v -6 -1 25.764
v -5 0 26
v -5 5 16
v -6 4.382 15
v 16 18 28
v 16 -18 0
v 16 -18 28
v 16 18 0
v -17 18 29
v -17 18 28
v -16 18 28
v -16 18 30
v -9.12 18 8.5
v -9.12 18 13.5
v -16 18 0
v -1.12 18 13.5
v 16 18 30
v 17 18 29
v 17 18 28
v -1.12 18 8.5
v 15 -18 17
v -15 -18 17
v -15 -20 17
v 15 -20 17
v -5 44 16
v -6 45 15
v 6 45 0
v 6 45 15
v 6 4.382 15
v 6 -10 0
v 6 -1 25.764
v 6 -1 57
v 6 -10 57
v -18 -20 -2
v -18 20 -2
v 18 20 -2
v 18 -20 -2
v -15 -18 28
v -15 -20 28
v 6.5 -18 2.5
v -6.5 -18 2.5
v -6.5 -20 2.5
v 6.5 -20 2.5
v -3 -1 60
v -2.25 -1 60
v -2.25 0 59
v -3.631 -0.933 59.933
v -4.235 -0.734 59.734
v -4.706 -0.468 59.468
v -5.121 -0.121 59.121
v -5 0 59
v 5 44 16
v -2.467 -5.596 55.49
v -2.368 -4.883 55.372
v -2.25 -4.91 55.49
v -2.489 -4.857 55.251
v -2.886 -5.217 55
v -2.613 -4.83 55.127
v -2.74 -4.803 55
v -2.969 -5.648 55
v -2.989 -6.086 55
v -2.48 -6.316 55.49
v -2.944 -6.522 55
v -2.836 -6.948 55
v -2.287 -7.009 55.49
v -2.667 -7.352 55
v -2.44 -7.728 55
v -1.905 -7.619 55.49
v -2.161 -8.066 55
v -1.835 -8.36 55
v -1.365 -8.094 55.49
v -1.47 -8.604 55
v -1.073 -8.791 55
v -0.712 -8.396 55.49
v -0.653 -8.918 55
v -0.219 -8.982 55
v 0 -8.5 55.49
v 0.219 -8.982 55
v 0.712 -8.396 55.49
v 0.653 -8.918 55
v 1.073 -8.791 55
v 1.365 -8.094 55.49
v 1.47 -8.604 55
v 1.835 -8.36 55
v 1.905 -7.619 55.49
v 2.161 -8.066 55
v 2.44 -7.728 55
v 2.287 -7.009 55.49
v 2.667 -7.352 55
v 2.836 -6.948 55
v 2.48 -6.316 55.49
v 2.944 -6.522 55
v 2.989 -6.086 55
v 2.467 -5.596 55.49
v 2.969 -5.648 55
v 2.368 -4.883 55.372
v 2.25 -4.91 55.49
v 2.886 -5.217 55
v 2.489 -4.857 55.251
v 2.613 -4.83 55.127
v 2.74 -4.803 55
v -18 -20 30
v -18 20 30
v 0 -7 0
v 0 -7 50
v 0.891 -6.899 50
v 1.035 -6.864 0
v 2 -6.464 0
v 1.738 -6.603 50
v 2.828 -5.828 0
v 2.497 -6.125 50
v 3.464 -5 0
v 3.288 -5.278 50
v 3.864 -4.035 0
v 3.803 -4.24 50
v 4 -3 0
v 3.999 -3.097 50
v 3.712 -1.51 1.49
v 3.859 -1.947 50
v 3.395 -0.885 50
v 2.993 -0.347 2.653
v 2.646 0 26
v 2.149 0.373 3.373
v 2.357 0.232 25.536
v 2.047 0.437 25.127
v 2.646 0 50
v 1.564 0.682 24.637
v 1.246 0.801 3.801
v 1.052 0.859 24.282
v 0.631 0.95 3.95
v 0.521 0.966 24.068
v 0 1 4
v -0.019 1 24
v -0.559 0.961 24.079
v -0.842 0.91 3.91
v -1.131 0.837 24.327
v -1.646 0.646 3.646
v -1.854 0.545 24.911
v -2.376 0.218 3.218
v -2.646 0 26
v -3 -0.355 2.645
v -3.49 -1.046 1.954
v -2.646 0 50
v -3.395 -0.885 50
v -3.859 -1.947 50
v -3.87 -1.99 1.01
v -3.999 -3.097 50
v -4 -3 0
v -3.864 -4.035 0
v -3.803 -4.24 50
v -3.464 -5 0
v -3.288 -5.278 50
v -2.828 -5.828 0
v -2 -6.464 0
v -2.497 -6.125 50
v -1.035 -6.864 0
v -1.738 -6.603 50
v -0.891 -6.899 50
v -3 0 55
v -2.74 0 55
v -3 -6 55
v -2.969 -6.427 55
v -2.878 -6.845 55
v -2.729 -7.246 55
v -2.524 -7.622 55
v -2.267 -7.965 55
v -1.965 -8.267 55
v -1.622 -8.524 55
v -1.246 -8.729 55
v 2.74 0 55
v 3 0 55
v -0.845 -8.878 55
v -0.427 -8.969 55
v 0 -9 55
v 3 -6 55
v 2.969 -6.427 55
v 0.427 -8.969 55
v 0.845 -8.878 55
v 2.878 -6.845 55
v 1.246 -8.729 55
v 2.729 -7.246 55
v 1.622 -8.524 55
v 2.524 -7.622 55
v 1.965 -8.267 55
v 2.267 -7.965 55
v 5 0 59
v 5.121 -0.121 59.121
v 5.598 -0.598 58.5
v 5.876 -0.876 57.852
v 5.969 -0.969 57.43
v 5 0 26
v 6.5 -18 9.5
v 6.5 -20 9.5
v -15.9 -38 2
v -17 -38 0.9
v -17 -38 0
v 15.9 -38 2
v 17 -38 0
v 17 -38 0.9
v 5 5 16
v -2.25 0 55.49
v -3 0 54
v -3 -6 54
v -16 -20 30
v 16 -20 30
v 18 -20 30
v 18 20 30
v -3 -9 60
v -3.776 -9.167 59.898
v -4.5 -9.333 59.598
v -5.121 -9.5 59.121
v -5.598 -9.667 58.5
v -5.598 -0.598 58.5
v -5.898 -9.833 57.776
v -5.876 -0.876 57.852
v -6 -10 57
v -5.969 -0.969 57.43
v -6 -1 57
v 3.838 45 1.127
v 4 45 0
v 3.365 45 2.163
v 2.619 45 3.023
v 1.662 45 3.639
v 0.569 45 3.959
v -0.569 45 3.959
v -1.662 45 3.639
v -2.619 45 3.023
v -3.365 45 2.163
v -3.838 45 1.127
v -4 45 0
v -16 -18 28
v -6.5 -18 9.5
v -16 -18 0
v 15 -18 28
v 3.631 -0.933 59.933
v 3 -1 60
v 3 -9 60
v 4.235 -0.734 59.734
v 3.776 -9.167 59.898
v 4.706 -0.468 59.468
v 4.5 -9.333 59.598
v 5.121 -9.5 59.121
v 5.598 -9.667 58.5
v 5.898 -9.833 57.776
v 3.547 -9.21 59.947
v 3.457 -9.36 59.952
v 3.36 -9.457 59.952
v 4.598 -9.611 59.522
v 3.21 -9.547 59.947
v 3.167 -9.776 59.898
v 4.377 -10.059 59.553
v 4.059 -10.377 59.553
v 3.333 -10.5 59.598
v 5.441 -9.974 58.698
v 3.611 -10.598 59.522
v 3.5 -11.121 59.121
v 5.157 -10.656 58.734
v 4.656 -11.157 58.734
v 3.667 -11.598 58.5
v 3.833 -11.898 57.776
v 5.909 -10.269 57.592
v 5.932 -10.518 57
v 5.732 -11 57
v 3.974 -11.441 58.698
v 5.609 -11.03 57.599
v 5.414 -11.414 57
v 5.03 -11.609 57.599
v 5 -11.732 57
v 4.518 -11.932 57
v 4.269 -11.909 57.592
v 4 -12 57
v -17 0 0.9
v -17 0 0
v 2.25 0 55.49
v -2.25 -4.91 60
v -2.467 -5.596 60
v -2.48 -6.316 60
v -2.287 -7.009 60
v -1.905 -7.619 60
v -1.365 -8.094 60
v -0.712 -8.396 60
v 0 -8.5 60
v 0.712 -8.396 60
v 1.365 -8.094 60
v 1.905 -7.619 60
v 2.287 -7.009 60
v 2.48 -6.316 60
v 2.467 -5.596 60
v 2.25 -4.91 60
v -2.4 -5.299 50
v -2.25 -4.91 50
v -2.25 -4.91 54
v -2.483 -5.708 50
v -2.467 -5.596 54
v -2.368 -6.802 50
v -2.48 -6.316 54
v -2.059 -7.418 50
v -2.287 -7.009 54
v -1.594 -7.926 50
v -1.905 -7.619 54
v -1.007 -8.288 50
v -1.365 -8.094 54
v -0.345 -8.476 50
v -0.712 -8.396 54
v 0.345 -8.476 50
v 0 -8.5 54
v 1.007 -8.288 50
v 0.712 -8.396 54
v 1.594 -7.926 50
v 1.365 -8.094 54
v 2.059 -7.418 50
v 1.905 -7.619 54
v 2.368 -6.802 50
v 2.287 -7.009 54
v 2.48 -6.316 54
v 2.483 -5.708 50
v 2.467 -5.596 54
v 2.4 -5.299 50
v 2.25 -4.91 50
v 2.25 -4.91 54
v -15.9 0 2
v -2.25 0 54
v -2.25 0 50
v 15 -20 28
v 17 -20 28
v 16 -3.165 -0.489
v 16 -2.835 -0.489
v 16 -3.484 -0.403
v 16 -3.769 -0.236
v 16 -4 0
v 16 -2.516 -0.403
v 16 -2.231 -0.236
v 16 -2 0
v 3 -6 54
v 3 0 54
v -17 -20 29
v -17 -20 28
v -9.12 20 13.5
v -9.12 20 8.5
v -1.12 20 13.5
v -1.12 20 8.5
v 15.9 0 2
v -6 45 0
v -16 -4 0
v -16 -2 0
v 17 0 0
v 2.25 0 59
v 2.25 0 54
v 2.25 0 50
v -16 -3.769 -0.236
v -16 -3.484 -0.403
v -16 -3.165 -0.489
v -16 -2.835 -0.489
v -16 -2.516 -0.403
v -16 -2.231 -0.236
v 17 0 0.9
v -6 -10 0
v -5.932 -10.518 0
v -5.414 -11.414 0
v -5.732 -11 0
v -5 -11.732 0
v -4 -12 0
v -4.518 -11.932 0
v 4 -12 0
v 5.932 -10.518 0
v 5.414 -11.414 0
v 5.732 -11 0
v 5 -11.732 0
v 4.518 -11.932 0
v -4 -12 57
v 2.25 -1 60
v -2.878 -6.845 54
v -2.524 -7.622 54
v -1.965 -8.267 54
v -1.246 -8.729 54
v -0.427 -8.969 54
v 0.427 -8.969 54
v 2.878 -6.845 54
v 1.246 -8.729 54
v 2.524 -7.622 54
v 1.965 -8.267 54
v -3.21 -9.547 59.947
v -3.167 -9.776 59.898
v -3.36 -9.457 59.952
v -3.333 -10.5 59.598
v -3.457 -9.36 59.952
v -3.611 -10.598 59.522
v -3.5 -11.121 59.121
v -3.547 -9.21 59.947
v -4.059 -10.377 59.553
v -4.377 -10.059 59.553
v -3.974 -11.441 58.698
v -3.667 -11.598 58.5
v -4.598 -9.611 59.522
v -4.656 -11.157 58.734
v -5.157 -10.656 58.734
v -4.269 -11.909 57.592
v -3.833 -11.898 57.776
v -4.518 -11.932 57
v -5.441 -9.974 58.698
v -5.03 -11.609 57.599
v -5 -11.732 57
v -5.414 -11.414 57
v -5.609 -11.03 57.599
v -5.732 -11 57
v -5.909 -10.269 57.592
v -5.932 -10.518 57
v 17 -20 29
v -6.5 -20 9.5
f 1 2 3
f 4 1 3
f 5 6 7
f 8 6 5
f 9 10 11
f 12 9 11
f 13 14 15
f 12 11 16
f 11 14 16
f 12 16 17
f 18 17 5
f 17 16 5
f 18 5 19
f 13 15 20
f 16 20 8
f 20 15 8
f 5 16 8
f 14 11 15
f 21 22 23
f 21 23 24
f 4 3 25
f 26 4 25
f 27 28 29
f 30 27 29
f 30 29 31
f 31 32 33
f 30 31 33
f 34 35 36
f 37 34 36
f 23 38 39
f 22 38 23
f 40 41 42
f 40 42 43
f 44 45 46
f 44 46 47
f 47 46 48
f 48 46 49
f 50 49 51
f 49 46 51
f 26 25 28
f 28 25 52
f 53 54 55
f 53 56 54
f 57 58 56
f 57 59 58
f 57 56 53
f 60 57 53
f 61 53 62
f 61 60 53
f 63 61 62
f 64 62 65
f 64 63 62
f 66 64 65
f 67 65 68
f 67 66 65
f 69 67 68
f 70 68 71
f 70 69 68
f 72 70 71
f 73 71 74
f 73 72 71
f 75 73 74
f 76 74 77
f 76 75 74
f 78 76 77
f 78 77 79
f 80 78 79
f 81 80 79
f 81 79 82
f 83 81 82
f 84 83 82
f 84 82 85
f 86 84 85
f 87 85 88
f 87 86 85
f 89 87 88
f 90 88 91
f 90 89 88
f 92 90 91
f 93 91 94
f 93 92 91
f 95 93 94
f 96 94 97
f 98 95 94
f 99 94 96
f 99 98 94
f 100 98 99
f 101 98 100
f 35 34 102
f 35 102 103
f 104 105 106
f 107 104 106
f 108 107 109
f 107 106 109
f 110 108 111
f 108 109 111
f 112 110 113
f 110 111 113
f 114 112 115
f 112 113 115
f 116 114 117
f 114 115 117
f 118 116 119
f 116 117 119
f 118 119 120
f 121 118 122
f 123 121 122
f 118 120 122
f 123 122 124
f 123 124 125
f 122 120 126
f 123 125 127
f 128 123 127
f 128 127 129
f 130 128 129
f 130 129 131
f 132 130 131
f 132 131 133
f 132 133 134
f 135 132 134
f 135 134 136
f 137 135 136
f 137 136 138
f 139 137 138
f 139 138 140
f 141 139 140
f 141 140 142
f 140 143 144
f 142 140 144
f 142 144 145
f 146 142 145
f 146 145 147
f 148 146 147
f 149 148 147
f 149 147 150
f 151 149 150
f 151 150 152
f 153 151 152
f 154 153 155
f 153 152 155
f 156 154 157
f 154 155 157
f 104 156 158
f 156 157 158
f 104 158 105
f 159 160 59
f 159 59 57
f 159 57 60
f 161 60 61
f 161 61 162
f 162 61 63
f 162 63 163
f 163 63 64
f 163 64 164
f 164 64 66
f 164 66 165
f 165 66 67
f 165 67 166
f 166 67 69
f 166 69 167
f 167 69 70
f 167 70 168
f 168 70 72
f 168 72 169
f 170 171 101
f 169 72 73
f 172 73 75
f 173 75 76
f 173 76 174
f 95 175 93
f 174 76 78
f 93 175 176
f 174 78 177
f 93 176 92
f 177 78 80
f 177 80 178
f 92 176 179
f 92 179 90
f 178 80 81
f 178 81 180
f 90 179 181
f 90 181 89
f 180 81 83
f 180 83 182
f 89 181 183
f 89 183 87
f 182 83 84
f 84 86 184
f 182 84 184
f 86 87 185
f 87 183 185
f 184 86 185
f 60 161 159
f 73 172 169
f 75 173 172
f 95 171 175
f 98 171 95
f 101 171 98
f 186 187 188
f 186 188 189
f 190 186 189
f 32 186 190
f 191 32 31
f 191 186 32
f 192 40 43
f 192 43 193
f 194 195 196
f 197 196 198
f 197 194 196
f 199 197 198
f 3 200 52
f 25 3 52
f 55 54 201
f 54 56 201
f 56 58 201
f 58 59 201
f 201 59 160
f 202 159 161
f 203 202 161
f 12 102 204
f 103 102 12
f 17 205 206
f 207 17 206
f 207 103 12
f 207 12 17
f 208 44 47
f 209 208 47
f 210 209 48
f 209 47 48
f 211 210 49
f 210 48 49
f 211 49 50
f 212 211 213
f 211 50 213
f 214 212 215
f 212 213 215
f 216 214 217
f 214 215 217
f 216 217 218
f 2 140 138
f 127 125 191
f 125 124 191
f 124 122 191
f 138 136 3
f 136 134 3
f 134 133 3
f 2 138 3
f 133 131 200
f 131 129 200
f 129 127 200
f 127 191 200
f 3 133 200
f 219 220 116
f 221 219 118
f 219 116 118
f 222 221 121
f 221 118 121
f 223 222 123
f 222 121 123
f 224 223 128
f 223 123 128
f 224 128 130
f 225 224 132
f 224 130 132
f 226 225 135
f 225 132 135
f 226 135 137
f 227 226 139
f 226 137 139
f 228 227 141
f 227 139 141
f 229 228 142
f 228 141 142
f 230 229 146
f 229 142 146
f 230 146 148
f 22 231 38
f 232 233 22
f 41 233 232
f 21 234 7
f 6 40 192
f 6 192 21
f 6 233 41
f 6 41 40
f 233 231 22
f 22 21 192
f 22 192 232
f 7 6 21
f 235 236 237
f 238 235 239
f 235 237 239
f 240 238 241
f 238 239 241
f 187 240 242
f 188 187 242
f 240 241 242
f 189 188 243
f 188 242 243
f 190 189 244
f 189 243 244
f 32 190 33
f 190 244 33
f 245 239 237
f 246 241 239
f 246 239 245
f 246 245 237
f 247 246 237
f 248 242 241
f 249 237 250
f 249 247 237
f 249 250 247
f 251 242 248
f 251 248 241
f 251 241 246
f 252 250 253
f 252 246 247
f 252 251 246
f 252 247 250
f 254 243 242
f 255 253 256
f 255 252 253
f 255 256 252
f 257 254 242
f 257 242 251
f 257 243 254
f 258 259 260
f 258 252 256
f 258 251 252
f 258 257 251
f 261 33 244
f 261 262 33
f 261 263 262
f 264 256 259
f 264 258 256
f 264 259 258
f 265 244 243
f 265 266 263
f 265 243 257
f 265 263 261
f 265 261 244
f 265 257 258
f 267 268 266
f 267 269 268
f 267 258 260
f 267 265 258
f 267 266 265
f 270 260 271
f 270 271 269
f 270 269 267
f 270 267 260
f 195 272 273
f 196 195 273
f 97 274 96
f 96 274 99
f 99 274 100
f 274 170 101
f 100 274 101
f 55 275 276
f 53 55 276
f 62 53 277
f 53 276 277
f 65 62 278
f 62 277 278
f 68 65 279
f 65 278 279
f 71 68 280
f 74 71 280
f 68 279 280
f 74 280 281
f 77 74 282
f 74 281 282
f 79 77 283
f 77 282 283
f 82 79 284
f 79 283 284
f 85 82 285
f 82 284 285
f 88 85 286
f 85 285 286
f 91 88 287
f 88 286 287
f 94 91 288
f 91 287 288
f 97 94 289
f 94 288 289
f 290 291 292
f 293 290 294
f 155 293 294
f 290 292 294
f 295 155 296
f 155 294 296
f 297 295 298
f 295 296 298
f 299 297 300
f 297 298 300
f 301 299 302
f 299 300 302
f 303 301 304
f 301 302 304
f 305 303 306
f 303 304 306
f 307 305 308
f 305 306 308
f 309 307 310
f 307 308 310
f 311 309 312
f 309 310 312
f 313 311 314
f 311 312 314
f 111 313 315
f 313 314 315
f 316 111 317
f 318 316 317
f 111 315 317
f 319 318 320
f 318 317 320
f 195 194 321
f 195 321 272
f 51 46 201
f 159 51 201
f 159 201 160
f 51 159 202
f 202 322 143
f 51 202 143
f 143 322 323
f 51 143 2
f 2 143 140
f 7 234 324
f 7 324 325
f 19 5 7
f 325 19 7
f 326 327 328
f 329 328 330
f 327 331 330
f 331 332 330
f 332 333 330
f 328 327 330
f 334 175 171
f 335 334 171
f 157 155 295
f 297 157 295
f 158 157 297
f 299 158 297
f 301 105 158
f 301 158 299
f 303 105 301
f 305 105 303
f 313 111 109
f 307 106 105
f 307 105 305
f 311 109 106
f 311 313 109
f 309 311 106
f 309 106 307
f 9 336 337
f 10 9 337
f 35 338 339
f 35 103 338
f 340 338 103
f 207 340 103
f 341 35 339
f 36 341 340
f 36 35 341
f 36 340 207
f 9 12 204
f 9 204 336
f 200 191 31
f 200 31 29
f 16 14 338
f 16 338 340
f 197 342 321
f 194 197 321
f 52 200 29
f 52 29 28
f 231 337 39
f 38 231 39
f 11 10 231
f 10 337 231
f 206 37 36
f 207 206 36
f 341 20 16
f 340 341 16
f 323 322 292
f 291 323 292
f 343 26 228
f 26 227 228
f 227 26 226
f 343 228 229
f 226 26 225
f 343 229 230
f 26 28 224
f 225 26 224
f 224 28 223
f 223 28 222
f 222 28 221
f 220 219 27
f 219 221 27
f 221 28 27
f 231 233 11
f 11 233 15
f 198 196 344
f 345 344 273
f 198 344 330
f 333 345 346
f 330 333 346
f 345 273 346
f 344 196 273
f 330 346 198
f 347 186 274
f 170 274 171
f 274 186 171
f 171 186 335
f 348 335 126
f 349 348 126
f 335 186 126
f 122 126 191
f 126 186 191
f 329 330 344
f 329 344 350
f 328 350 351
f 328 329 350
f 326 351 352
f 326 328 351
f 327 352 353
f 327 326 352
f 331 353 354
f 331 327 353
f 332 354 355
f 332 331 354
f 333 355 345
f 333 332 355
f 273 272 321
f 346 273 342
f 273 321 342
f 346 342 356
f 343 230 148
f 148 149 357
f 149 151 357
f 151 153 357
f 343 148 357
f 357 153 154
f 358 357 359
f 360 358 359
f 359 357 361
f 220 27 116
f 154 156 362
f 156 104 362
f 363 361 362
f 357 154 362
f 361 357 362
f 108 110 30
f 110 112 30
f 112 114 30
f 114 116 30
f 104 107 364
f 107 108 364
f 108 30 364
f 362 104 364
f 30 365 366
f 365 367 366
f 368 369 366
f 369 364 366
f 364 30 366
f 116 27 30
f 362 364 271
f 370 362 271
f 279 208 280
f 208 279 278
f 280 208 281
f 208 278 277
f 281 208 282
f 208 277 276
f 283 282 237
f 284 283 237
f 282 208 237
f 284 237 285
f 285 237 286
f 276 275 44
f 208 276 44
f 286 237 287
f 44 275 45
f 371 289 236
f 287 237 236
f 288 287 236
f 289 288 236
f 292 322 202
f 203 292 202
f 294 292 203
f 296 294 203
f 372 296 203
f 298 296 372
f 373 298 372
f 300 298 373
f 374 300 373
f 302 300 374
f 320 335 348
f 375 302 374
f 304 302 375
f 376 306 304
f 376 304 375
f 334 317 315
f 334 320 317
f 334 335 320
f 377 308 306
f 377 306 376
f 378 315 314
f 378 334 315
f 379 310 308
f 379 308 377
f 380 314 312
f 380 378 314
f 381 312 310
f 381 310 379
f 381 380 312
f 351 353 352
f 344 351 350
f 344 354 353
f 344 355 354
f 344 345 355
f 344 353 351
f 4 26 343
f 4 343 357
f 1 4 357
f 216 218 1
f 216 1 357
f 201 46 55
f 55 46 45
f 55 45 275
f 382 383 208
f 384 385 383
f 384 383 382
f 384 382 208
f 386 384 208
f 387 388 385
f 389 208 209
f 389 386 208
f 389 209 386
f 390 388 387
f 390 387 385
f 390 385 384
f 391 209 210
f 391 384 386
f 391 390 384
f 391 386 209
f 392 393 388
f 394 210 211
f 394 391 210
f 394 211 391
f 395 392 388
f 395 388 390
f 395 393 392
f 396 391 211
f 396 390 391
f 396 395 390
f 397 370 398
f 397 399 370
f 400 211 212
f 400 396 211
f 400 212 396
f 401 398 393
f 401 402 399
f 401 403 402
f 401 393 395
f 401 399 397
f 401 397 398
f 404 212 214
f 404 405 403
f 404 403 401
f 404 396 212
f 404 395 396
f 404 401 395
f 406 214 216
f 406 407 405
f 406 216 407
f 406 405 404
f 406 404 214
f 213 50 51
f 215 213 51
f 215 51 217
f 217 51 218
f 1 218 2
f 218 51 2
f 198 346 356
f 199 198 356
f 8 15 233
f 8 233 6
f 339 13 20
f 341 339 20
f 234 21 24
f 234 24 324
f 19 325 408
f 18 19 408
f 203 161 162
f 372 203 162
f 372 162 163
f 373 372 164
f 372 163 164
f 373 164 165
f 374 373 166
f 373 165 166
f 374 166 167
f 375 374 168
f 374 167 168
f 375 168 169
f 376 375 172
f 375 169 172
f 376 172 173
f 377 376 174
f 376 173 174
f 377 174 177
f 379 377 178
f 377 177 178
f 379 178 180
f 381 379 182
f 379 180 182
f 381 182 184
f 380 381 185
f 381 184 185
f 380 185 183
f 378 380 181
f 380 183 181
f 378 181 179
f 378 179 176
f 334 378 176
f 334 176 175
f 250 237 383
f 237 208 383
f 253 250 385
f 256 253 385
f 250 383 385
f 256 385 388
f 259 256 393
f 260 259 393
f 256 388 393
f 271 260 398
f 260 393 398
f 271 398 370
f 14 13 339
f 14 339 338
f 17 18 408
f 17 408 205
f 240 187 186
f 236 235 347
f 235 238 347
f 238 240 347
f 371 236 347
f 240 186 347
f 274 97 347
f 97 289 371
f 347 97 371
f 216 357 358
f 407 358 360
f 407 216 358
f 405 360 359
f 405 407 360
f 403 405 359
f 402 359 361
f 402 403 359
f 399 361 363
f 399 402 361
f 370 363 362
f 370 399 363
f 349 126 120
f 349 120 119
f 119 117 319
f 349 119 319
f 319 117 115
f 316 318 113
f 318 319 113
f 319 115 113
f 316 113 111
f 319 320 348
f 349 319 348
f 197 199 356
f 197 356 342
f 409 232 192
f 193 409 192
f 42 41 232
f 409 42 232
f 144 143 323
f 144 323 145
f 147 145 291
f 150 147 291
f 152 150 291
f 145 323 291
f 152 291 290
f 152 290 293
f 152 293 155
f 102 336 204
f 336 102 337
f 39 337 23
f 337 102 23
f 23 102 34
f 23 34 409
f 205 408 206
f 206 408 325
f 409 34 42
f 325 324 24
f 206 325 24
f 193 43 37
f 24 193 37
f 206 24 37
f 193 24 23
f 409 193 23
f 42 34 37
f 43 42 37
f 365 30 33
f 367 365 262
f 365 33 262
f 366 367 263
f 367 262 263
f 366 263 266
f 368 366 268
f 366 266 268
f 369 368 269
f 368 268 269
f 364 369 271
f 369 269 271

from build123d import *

# Parameters (mm, degrees)
PAD_DEPTH       = 6
POCKET_DEPTH    = 10
POCKET001_DEPTH = 1
SKETCH003_R     = 4
POCKET002_DEPTH = 50.001
SKETCH004_R     = 4
POCKET003_DEPTH = 48.001
CHAMFER_SIZE    = 1
FILLET_R        = 2
FILLET001_R     = 3
CHAMFER001_SIZE = 0.49
SKETCH005_W     = 32
SKETCH005_H     = 36
PAD001_DEPTH    = 30
THICKNESS_T     = 2
SKETCH006_W     = 13
SKETCH006_H     = 7
POCKET004_DEPTH = 20.001
SKETCH007_W     = 8
SKETCH007_H     = 5
POCKET005_DEPTH = 20.001
POCKET006_START = -2
POCKET006_DEPTH = 98
SKETCH012_W     = 30
SKETCH012_H     = 10
POCKET007_DEPTH = 20.001
PAD003_DEPTH    = 38
PAD004_DEPTH    = 16


with BuildPart() as body:
    # Sketch → Pad (new body, symmetric)
    with BuildSketch(Plane.YZ):
        Polygon((45, 0), (-12, 0), (-12, 60), (0, 60), (0, 26), (5, 16), (45, 16), align=None)
    extrude(amount=PAD_DEPTH, both=True)

    # Sketch001 (on Face3 of Pad) → Pocket (cut)
    with BuildSketch(Plane(origin=(0, 0, 60), x_dir=(0, -1, 0), z_dir=(0, 0, 1))):
        with BuildLine():
            Line((-8, 2.25), (-8, -2.25))
            Line((-8, -2.25), (4.910275, -2.25))
            ThreePointArc((4.910275, -2.25), (8.5, 0), (4.910275, 2.25))
            Line((4.910275, 2.25), (-8, 2.25))
        make_face()
    extrude(amount=-POCKET_DEPTH, mode=Mode.SUBTRACT)

    # Sketch002 (on Face3 of Pad) → Pocket001 (cut)
    with BuildSketch(Plane(origin=(0, 0, 55), x_dir=(0, -1, 0), z_dir=(0, 0, 1))):
        with BuildLine():
            Line((-4, 3), (-4, -3))
            Line((-4, -3), (6, -3))
            ThreePointArc((6, -3), (9, 0), (6, 3))
            Line((6, 3), (-4, 3))
        make_face()
    extrude(amount=-POCKET001_DEPTH, mode=Mode.SUBTRACT)

    # Sketch003 (on Face3 of Pad) → Pocket002 (cut, through all)
    with BuildSketch(Plane(origin=(0, 0, 50), x_dir=(0, -1, 0), z_dir=(0, 0, 1))):
        with Locations((3, 0)):
            Circle(SKETCH003_R)
    extrude(amount=-POCKET002_DEPTH, mode=Mode.SUBTRACT)

    # Sketch004 → Pocket003 (cut, through all)
    with BuildSketch(Plane.XZ.offset(3)):
        Circle(SKETCH004_R)
    extrude(amount=-POCKET003_DEPTH, mode=Mode.SUBTRACT)

    # Chamfer
    chamfer_edges = [body.edges().sort_by_distance(p)[0] for p in [
        (6, 25, 16),
        (-6, 25, 16),
        (0, 45, 16),
        (6, 2.5, 21),
        (-6, 2.5, 21),
        (6, 0, 43),
        (-6, 0, 43),
        (4.125, 0, 60),
        (-4.125, 0, 60),
    ]]
    chamfer(chamfer_edges, length=CHAMFER_SIZE)

    # Fillet
    fillet_edges = [body.edges().sort_by_distance(p)[0] for p in [
        (-6, -12, 30),
        (6, -12, 30),
    ]]
    fillet(fillet_edges, radius=FILLET_R)

    # Fillet001
    fillet001_edges = [body.edges().sort_by_distance(p)[0] for p in [
        (0, -12, 60),
        (6, -5.5, 60),
        (-6, -5.5, 60),
    ]]
    fillet(fillet001_edges, radius=FILLET001_R)

    # Chamfer001
    chamfer001_edges = [body.edges().sort_by_distance(p)[0] for p in [
        (0, -8.5, 55),
        (-2.25, -2.455138, 55),
        (2.25, -2.455138, 55),
    ]]
    chamfer(chamfer001_edges, length=CHAMFER001_SIZE)


with BuildPart() as boxbody:
    # Sketch005 → Pad001 (new body)
    with BuildSketch(Plane.XY):
        Rectangle(SKETCH005_W, SKETCH005_H)
    extrude(amount=PAD001_DEPTH)

    # Thickness
    thickness_openings = [boxbody.faces().sort_by_distance(p)[0] for p in [
        (0, 0, 30),
    ]]
    offset(amount=THICKNESS_T, openings=thickness_openings, kind=Kind.INTERSECTION)

    # Sketch006 → Pocket004 (cut, through all)
    with BuildSketch(Plane.XZ):
        with Locations((0, 6)):
            Rectangle(SKETCH006_W, SKETCH006_H)
    extrude(amount=POCKET004_DEPTH, mode=Mode.SUBTRACT)

    # Sketch007 → Pocket005 (cut, through all)
    with BuildSketch(Plane.XZ):
        with Locations((-5.12, 11)):
            Rectangle(SKETCH007_W, SKETCH007_H)
    extrude(amount=-POCKET005_DEPTH, mode=Mode.SUBTRACT)

    # Sketch008 (on Face11 of Pocket005) → Pocket006 (cut)
    with BuildSketch(Plane(origin=(0, 20, 0), x_dir=(-1, 0, 0), z_dir=(0, 1, 0)).offset(POCKET006_START)):
        Polygon((-16, 30), (16, 30), (17, 29), (17, 28), (-17, 28), (-17, 29), align=None)
    extrude(amount=-POCKET006_DEPTH, mode=Mode.SUBTRACT)

    # Sketch012 → Pocket007 (cut, through all)
    with BuildSketch(Plane.XZ):
        with Locations((0, 22)):
            Rectangle(SKETCH012_W, SKETCH012_H)
        with Locations((0, 32)):
            Rectangle(SKETCH012_W, SKETCH012_H)
    extrude(amount=POCKET007_DEPTH, mode=Mode.SUBTRACT)


with BuildPart() as coverbody:
    # Sketch010 → Pad003 (new body)
    with BuildSketch(Plane.XZ):
        Polygon((-17, 0), (17, 0), (17, 0.9), (15.9, 2), (-15.9, 2), (-17, 0.9), align=None)
    extrude(amount=PAD003_DEPTH)

    # Sketch011 → Pad004 (join, symmetric)
    with BuildSketch(Plane.YZ):
        with BuildLine():
            Line((-4, 0), (-2, 0))
            ThreePointArc((-4, 0), (-3, -0.5), (-2, 0))
        make_face()
    extrude(amount=PAD004_DEPTH, both=True)


solid = Compound([body.part, boxbody.part, coverbody.part])
